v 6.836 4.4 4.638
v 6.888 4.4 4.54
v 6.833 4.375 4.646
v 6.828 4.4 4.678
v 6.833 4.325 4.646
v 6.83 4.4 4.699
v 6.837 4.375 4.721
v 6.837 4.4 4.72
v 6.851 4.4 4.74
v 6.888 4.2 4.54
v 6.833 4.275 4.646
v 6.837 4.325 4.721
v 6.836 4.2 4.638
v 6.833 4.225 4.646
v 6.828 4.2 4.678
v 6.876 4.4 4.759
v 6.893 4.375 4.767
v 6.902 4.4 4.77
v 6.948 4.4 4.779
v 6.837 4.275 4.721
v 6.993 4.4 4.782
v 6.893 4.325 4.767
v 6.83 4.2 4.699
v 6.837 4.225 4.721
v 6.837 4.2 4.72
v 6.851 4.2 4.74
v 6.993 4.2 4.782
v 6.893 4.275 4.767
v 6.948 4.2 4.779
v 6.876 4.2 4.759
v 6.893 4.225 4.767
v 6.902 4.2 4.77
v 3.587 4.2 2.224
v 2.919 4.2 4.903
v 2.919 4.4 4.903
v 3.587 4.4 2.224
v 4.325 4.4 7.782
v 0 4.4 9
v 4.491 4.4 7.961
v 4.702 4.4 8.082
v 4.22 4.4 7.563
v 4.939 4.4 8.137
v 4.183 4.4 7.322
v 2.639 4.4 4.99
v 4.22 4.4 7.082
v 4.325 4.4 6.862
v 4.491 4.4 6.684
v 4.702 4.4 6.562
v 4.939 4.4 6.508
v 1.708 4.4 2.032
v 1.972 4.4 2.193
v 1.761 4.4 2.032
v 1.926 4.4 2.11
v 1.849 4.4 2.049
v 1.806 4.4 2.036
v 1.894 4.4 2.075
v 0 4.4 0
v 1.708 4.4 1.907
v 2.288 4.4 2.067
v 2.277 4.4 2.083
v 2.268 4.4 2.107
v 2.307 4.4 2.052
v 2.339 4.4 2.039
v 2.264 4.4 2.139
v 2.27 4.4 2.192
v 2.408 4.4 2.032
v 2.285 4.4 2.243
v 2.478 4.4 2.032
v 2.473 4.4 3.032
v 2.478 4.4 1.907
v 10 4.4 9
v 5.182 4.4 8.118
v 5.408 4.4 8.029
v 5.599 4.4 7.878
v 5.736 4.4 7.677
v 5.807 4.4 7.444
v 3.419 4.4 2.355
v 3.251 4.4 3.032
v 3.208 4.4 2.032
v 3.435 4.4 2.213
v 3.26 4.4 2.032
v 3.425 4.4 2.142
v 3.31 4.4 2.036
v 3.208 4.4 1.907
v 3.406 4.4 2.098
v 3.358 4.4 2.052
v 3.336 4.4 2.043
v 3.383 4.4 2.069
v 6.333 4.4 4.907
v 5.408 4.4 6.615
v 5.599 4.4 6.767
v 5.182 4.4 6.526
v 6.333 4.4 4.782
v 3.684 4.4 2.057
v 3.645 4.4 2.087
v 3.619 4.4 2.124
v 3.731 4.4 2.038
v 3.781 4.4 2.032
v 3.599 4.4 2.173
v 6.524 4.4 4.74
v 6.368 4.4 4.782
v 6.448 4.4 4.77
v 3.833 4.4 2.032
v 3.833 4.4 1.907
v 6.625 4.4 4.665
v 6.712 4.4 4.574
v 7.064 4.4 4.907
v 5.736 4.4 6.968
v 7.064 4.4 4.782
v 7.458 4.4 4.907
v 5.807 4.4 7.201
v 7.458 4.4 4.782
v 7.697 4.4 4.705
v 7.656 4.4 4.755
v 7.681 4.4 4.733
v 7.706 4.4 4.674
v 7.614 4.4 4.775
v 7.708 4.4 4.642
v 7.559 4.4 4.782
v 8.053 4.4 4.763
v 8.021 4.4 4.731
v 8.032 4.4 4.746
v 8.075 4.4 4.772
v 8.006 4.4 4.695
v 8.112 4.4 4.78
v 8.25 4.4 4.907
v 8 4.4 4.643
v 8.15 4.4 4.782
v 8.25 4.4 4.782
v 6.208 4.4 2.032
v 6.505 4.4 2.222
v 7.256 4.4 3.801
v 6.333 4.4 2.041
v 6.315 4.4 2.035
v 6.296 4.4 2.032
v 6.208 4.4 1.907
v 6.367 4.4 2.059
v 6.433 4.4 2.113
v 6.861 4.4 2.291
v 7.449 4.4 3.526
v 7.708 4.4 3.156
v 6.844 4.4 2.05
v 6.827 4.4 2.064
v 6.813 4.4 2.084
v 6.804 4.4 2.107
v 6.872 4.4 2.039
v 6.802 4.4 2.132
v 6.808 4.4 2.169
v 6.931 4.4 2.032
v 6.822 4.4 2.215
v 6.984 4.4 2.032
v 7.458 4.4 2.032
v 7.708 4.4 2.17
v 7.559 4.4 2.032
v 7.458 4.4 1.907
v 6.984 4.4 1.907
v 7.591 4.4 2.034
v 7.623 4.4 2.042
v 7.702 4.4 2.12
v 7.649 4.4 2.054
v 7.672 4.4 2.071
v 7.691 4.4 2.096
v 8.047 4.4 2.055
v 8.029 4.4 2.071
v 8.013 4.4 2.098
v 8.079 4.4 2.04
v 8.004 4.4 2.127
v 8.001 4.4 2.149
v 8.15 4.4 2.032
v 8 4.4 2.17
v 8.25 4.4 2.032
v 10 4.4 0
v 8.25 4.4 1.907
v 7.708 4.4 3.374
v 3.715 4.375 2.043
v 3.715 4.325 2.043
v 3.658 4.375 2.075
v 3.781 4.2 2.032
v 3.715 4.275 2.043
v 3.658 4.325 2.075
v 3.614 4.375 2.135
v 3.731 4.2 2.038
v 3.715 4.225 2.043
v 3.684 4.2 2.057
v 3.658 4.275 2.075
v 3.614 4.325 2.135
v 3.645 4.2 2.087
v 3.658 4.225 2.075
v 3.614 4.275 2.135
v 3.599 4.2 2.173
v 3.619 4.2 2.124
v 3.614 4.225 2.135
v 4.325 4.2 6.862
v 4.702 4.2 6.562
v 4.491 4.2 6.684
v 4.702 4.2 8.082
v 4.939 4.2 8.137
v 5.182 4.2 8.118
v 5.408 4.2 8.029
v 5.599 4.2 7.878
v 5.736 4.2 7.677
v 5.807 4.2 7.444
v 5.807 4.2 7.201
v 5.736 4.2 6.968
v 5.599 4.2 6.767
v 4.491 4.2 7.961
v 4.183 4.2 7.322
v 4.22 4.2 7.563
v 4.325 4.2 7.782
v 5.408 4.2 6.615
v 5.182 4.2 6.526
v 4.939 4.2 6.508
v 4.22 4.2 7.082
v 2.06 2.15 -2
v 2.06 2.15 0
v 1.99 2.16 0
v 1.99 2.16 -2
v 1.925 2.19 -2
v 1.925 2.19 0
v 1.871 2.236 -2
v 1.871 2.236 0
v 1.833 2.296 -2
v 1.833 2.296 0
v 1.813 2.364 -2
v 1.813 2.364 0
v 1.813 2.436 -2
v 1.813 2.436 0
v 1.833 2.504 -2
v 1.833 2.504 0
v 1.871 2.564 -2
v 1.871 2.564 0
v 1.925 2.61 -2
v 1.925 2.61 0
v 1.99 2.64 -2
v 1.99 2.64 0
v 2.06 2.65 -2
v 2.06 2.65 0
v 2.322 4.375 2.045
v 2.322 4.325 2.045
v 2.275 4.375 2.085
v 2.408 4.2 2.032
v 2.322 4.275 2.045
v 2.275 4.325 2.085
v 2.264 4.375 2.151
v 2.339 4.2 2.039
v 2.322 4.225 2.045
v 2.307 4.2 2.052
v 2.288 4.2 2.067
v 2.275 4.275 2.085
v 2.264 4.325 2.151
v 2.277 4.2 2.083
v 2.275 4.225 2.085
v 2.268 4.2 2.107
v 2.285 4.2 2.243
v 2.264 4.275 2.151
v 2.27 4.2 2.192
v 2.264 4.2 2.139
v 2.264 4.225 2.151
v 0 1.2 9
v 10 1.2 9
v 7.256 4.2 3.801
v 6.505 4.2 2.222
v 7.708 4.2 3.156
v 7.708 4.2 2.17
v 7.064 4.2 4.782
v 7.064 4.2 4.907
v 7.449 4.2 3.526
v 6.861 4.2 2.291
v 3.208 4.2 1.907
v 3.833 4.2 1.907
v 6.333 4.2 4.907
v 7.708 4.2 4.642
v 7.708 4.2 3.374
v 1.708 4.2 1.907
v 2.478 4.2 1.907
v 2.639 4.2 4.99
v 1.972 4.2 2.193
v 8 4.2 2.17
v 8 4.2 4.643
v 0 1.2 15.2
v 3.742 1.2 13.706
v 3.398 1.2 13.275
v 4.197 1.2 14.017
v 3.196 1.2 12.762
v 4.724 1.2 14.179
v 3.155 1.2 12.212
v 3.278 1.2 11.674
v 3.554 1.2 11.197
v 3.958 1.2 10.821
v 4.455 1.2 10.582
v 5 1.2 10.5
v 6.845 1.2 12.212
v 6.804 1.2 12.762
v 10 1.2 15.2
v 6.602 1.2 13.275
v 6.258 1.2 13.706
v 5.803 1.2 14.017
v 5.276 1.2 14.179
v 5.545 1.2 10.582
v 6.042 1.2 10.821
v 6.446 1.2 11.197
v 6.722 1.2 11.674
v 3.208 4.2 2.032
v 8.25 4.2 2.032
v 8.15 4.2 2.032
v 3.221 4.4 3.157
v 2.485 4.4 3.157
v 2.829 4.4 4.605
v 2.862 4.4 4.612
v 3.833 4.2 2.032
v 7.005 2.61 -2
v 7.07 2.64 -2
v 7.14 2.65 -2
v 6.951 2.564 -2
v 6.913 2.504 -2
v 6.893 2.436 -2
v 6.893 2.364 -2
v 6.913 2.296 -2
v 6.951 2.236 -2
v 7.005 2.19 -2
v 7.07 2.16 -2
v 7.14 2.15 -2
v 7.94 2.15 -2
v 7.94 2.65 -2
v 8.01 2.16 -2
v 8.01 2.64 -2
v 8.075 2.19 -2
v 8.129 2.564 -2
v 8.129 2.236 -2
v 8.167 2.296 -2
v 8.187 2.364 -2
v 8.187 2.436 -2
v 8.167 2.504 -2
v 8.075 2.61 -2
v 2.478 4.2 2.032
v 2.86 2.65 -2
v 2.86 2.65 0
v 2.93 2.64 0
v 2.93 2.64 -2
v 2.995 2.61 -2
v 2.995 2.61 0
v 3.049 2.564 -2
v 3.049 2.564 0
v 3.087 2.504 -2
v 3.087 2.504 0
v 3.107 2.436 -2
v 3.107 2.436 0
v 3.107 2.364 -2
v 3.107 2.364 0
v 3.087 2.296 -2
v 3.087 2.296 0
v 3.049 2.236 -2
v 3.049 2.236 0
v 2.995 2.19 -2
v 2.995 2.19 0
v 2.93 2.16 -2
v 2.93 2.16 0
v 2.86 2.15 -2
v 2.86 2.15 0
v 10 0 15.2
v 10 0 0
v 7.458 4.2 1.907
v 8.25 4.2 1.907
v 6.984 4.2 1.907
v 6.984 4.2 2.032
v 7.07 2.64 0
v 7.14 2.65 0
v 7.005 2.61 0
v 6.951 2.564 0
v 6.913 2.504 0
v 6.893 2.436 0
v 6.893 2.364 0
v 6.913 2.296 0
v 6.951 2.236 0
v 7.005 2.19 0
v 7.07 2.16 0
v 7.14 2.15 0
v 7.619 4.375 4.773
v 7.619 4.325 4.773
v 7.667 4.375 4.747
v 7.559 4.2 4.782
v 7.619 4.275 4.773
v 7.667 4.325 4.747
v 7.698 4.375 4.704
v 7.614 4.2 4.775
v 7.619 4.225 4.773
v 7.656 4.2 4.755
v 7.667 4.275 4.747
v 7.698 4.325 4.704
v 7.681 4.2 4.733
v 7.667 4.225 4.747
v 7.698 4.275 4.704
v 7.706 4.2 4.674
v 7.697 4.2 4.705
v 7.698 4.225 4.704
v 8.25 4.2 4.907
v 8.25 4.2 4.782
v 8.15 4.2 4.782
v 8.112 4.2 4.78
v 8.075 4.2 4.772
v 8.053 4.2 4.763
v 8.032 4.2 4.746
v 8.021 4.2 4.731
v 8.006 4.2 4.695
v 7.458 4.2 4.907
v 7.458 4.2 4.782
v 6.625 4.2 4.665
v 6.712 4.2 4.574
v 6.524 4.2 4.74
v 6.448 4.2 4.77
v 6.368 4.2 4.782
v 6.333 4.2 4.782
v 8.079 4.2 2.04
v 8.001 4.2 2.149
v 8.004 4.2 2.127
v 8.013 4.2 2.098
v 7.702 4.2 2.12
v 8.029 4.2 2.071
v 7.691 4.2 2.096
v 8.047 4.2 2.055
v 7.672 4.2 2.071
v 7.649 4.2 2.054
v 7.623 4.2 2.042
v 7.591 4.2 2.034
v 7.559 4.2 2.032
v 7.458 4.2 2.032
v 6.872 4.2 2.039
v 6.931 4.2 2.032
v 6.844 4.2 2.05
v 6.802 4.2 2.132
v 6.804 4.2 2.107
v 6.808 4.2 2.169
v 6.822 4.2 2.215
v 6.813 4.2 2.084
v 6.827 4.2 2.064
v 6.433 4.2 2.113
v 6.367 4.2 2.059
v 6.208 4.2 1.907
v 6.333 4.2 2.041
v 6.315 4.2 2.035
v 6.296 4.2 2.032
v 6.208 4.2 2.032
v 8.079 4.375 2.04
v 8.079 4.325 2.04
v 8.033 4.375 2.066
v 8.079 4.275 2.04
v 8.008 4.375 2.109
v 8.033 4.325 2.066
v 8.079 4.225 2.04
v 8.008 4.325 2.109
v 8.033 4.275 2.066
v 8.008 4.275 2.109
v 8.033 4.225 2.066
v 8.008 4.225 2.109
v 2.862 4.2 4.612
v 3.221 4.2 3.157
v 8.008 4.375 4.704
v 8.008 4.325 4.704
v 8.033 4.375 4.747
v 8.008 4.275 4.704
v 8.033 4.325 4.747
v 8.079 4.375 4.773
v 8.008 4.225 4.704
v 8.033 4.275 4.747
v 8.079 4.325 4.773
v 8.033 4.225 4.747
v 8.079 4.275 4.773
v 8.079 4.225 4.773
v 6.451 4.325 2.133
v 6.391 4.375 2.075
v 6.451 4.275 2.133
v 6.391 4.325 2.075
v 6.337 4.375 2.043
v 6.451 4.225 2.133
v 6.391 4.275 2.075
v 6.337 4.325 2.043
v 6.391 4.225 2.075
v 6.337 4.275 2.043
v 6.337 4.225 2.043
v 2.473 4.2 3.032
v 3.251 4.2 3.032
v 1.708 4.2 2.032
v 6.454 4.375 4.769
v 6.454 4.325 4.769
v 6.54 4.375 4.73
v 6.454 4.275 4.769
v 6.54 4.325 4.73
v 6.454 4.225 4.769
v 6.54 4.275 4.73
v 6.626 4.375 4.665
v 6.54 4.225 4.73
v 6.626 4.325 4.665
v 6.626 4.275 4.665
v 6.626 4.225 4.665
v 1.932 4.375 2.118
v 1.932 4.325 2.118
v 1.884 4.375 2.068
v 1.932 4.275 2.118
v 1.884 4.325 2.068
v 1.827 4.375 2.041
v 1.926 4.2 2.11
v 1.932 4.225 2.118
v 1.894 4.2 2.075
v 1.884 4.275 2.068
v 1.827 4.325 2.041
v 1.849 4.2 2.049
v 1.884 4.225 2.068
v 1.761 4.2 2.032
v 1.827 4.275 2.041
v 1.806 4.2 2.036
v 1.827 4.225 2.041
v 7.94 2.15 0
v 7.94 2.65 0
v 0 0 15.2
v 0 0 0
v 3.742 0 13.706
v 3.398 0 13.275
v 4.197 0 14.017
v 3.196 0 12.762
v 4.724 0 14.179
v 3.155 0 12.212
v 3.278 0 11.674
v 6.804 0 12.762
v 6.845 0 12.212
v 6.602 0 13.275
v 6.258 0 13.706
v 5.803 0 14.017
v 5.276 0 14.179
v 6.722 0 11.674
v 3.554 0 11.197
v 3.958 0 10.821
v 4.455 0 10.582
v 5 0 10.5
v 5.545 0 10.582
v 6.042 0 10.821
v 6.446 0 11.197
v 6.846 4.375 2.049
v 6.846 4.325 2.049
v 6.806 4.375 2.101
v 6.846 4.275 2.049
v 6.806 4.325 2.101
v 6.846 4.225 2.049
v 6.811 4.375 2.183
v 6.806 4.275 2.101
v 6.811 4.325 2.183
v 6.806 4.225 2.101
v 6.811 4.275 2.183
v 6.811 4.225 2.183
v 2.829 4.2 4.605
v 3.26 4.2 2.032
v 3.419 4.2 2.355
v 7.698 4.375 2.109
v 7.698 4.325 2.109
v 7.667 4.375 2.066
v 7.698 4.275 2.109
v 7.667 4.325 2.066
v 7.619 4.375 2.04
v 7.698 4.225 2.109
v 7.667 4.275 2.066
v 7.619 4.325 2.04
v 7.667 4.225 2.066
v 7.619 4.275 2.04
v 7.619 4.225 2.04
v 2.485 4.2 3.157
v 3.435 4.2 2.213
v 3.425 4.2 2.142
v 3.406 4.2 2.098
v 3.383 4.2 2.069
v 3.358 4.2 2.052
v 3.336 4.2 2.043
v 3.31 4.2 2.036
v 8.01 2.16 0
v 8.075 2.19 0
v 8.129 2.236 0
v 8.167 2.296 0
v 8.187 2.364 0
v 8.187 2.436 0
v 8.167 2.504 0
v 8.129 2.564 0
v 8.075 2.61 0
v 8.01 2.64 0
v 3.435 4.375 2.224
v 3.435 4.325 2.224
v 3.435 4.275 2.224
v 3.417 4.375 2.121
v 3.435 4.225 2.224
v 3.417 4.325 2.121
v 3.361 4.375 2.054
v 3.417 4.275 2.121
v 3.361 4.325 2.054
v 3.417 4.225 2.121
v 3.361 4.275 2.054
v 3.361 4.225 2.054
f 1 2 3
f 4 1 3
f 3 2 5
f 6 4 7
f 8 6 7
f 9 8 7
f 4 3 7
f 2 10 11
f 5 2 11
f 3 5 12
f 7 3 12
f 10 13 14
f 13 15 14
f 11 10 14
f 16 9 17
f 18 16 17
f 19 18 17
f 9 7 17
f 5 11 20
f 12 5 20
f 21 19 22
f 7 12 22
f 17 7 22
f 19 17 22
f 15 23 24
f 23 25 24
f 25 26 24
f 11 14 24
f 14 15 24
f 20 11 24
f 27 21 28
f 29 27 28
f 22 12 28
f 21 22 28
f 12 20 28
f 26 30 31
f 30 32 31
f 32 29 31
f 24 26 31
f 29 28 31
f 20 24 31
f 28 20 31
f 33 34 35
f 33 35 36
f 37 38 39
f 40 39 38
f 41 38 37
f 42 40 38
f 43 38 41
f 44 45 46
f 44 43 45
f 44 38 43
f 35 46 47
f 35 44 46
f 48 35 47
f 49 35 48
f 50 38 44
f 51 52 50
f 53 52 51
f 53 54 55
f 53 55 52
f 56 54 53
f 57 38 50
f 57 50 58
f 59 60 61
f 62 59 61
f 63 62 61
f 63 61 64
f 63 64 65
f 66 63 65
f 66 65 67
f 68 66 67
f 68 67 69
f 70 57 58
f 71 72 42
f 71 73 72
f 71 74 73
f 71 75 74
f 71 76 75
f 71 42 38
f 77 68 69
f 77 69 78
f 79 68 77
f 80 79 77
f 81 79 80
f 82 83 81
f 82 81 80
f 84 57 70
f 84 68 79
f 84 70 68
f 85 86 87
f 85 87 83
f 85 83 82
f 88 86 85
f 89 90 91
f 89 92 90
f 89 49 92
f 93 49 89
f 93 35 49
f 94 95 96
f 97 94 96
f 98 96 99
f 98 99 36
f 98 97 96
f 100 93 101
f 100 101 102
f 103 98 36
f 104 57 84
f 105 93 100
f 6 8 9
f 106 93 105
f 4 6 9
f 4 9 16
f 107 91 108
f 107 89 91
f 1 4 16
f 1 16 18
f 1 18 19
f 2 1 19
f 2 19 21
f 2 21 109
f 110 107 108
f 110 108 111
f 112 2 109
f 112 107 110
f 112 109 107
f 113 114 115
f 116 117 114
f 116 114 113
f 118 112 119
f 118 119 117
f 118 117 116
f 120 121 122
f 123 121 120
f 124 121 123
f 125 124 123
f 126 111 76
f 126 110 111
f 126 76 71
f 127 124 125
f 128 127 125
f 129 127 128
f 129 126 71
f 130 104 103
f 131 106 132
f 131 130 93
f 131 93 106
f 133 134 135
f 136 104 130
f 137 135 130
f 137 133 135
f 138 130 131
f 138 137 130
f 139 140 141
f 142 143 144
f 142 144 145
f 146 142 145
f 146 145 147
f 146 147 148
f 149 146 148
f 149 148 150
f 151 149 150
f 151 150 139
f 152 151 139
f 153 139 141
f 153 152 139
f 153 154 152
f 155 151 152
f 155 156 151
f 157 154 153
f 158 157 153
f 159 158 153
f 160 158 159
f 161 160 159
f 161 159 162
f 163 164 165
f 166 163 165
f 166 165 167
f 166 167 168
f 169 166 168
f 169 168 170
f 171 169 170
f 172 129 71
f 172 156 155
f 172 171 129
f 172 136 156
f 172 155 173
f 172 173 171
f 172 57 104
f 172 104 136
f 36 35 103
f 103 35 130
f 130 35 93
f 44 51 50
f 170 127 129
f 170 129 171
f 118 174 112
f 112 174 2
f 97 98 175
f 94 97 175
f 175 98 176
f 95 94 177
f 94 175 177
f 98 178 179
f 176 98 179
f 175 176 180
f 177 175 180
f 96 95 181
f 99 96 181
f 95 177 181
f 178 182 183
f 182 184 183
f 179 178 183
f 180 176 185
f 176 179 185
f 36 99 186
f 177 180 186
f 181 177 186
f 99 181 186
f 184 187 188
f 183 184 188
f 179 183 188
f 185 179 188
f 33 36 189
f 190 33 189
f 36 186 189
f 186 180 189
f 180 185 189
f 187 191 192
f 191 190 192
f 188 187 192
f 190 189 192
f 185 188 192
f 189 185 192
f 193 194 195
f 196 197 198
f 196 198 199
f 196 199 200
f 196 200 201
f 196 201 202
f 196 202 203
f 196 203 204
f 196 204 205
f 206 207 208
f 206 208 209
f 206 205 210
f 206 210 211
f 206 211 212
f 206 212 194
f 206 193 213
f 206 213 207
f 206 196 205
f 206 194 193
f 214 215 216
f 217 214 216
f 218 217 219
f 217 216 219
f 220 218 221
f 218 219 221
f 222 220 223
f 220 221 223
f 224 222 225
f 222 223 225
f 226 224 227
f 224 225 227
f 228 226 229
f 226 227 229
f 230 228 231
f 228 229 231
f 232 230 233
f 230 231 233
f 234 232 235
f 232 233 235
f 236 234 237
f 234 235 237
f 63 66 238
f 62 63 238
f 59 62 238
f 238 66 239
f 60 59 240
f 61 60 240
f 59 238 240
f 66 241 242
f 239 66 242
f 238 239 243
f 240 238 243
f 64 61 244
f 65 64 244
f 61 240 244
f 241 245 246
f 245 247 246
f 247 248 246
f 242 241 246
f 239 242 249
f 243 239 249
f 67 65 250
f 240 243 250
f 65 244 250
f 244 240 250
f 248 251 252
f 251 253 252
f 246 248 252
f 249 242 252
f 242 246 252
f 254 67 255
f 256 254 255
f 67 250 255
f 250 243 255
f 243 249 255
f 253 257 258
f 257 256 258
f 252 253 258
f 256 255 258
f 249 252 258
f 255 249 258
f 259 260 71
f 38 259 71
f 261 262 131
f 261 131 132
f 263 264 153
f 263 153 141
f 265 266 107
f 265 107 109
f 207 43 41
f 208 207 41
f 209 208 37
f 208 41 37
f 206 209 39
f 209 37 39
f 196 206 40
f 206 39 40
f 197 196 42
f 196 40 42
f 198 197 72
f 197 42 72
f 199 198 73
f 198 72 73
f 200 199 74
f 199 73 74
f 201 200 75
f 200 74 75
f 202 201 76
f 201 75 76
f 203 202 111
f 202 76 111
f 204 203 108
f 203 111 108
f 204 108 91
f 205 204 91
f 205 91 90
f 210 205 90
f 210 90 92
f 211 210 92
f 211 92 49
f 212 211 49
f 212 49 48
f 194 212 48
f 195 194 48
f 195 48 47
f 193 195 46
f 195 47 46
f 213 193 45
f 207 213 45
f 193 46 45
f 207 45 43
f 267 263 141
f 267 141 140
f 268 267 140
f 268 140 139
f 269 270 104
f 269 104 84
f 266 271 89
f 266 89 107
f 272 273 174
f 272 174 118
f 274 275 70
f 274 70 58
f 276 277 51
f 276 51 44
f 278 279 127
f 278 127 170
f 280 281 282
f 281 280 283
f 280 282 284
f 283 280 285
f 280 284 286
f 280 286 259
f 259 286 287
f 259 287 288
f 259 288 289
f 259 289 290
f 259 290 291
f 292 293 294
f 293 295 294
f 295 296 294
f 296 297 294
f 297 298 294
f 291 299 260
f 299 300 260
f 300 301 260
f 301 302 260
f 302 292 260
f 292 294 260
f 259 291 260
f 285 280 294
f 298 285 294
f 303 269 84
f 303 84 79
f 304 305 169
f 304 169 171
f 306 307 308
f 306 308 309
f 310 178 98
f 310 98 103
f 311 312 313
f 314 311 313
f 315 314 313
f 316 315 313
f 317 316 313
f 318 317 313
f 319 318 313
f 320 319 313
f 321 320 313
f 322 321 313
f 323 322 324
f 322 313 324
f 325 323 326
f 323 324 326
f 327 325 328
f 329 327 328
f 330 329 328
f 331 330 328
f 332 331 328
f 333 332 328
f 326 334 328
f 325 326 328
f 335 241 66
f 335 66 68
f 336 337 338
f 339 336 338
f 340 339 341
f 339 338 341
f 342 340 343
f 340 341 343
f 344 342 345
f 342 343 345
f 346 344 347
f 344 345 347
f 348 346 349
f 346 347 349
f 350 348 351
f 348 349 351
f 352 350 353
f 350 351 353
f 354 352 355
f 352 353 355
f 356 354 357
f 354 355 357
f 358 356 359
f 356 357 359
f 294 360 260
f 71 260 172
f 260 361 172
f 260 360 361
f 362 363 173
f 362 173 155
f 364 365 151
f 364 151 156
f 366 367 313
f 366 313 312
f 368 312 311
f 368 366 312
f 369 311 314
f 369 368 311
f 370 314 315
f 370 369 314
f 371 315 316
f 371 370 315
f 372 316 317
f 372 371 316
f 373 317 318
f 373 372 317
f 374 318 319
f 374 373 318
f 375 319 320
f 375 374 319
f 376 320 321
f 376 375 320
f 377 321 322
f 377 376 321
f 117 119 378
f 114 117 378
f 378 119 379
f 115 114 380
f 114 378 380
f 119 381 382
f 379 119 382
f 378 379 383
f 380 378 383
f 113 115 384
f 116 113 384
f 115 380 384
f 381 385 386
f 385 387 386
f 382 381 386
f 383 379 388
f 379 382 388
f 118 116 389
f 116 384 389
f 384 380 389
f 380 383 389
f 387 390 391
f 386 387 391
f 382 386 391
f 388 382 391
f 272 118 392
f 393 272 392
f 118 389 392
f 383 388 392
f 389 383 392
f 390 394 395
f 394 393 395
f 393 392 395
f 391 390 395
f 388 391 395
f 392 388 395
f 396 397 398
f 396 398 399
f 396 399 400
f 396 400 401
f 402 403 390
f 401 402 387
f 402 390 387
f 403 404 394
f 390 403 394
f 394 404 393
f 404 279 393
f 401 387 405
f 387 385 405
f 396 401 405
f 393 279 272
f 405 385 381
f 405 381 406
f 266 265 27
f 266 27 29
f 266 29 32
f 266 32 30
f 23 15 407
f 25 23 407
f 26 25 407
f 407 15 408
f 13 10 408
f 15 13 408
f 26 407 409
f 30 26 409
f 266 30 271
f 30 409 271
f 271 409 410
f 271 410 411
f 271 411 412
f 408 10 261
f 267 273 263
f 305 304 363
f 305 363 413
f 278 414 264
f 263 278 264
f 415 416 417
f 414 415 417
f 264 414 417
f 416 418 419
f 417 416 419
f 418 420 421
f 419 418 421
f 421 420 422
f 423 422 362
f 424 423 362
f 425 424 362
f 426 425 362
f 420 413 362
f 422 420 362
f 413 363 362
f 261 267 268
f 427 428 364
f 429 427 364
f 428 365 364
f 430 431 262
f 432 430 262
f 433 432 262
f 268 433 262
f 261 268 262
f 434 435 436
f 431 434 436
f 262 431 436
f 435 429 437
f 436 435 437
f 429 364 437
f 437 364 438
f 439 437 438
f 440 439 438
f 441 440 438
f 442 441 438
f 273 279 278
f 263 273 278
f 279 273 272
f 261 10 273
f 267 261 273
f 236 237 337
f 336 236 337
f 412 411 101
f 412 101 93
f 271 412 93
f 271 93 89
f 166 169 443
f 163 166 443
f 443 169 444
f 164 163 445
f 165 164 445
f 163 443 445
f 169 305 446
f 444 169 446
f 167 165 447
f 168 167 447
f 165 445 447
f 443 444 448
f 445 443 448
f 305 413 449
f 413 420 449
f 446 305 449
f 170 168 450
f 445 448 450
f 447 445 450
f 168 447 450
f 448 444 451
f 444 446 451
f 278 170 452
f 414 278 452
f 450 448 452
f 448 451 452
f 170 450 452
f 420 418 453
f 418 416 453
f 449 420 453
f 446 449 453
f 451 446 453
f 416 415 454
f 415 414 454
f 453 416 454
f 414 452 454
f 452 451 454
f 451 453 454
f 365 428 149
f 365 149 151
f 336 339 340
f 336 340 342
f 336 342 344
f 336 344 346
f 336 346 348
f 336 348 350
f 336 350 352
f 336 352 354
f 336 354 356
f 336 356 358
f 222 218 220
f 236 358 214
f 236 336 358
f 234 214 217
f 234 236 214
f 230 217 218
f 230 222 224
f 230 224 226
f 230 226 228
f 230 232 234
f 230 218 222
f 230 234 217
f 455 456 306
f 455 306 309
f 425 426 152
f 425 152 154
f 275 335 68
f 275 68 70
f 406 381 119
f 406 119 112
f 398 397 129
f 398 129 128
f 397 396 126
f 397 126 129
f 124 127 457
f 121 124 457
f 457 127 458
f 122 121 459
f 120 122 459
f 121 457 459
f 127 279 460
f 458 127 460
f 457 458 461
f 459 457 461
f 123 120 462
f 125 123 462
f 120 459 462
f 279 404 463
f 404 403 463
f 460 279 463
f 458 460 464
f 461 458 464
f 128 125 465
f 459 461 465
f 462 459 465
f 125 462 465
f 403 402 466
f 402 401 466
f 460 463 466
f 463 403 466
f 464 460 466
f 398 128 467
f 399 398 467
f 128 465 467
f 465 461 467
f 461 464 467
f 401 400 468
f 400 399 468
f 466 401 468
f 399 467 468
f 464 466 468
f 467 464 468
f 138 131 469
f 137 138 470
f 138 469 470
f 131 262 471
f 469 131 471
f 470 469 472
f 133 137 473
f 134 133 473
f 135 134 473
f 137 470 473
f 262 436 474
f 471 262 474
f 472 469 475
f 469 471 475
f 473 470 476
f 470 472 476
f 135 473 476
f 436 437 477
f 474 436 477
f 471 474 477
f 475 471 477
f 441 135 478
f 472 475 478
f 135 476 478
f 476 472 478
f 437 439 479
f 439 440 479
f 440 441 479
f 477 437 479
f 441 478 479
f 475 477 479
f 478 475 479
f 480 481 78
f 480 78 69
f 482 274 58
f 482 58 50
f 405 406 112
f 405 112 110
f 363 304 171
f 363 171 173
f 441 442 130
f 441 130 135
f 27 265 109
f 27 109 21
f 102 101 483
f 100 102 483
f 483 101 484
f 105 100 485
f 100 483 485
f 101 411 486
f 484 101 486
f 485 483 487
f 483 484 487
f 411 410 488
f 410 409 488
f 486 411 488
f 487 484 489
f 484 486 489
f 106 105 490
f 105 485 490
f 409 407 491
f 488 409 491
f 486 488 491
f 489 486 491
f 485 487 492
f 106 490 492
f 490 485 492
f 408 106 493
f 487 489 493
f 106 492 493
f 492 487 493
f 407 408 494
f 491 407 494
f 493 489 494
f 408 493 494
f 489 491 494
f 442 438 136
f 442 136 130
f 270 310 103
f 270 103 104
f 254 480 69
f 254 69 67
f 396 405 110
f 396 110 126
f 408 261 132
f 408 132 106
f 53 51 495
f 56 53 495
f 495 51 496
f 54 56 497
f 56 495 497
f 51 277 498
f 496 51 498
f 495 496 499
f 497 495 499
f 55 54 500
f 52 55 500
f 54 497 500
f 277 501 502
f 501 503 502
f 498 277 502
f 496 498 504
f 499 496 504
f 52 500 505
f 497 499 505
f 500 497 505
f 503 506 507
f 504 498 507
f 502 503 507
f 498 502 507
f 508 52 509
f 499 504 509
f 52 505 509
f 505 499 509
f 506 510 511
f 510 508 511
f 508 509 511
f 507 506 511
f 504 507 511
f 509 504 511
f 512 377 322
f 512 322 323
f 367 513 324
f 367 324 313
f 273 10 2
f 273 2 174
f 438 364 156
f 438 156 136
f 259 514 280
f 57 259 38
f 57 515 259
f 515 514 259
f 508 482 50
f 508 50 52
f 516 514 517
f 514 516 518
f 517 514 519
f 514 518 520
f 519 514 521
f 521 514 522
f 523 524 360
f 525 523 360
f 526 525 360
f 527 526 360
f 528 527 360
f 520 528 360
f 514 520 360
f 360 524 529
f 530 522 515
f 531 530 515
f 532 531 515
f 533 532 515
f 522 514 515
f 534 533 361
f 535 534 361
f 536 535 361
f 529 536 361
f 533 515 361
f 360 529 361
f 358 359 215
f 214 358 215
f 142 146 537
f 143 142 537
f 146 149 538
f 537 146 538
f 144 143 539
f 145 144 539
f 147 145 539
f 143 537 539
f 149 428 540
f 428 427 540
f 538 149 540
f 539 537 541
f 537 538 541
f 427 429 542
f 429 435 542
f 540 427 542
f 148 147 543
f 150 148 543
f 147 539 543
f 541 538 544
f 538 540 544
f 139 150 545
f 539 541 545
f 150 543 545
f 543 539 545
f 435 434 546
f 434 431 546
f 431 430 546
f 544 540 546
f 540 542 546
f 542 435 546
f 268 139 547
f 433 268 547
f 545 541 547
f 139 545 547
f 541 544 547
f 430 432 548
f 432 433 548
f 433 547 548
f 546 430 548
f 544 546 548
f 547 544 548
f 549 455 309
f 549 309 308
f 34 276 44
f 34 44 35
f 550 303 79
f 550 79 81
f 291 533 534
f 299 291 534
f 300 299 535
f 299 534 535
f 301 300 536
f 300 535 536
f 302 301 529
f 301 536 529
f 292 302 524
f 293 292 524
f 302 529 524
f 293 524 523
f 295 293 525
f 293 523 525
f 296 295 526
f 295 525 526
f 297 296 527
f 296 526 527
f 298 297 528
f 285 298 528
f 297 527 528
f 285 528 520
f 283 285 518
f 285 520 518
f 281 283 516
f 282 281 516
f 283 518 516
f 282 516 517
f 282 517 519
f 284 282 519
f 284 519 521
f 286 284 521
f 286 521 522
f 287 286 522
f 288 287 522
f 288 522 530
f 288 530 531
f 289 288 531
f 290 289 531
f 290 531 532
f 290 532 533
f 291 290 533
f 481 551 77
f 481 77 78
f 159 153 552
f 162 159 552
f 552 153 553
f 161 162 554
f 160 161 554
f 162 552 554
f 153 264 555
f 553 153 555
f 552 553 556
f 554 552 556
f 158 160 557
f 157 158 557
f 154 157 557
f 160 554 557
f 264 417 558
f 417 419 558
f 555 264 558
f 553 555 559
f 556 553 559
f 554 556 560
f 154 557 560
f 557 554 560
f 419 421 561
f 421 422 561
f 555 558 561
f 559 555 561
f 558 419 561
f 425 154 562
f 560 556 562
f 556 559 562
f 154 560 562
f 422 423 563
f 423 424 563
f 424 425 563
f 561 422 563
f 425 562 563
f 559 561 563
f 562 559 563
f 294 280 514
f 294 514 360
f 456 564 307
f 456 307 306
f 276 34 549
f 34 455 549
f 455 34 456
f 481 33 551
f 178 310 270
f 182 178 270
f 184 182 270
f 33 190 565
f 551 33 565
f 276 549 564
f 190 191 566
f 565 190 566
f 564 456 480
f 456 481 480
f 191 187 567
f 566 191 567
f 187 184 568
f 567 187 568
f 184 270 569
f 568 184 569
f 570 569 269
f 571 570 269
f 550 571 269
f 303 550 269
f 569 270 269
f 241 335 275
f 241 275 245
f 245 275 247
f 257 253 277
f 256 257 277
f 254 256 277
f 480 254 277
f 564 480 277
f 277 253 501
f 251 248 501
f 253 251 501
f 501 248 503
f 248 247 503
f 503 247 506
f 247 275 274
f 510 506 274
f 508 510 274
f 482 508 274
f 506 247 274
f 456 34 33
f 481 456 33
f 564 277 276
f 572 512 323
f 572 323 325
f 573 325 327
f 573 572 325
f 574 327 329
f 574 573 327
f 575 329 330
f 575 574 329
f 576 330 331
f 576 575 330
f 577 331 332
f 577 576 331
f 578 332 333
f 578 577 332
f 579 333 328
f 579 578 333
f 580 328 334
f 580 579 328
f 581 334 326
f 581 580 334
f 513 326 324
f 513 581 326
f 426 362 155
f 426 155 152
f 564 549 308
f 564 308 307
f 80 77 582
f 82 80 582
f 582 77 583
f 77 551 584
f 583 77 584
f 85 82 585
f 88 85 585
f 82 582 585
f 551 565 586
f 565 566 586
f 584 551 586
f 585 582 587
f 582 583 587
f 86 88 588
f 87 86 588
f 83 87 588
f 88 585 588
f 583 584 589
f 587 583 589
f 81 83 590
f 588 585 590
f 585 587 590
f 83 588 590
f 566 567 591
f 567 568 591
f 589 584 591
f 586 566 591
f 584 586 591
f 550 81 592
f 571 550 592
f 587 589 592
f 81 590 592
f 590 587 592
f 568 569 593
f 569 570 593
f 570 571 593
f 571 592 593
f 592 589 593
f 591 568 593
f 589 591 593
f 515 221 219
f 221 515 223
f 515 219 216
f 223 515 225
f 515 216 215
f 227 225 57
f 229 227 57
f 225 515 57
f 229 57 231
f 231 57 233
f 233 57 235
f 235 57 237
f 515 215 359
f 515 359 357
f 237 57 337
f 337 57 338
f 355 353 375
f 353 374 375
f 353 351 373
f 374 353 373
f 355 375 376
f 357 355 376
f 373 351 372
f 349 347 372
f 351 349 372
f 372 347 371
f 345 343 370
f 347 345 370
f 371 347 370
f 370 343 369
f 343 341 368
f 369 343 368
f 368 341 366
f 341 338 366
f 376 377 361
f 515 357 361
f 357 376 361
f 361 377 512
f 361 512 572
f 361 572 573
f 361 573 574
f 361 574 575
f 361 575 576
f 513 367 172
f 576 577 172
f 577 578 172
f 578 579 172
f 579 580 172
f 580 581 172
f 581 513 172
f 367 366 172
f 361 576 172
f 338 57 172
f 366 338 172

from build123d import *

# Parameters (mm, degrees)
SKETCH_1_W          = 10
SKETCH_1_H          = 4.4
EXTRUDE_1_DEPTH     = 15.2
SKETCH_2_W          = 6.2
SKETCH_2_H          = 3.2
CUT_EXTRUDE_1_DEPTH = 19.718974331
CUT_EXTRUDE_2_REACH = 20.719
SKETCH_3_R          = 1.85
SKETCH_4_R          = 0.816532351
CUT_EXTRUDE_3_DEPTH = 0.2
EXTRUDE_2_DEPTH     = 2
WRAP_START          = -0.2
WRAP_1_DEPTH        = 0.2


# Read off the part's stored shape, not the designer's step: 包覆1
with BuildPart() as part:
    # 草图1 → 凸台-拉伸1 (new body)
    with BuildSketch(Plane.XY):
        with Locations((5, 2.2)):
            Rectangle(SKETCH_1_W, SKETCH_1_H)
    extrude(amount=EXTRUDE_1_DEPTH)

    # 草图2 → 切除-拉伸1 (cut, through all)
    with BuildSketch(Plane(origin=(10, 0, 0), x_dir=(0, 0, -1), z_dir=(1, 0, 0))):
        with Locations((-12.1, 2.8)):
            Rectangle(SKETCH_2_W, SKETCH_2_H)
    extrude(amount=-CUT_EXTRUDE_1_DEPTH, mode=Mode.SUBTRACT)

    # 草图3 → 切除-拉伸2 (cut, up to next)
    with BuildSketch(Plane.XZ, mode=Mode.PRIVATE) as cut_extrude_2_sk1:
        with Locations(Location((5, 12.35, 0), (0, 0, 270))):
            Circle(SKETCH_3_R)
    cut_extrude_2_tool1 = extrude(cut_extrude_2_sk1.sketch, amount=-CUT_EXTRUDE_2_REACH, mode=Mode.PRIVATE) & part.part
    add(cut_extrude_2_tool1.solids().sort_by_distance((5, 0, 12.35))[0], mode=Mode.SUBTRACT)

    # 草图4 → 切除-拉伸3 (cut)
    with BuildSketch(Plane(origin=(0, 4.4, 0), x_dir=(-1, 0, 0), z_dir=(0, 1, 0))):
        with Locations((-5, 7.32228291)):
            Circle(SKETCH_4_R)
    extrude(amount=-CUT_EXTRUDE_3_DEPTH, mode=Mode.SUBTRACT)

    # 草图5 → 凸台-拉伸2 (add)
    with BuildSketch(Plane(origin=(0, 0, 0), x_dir=(-1, 0, 0), z_dir=(0, 0, -1))):
        with BuildLine():
            Line((-7.94, 2.65), (-7.14, 2.65))
            ThreePointArc((-7.14, 2.65), (-6.89, 2.4), (-7.14, 2.15))
            Line((-7.14, 2.15), (-7.94, 2.15))
            ThreePointArc((-7.94, 2.15), (-8.19, 2.4), (-7.94, 2.65))
        make_face()
        with BuildLine():
            Line((-2.06, 2.65), (-2.86, 2.65))
            ThreePointArc((-2.86, 2.65), (-3.11, 2.4), (-2.86, 2.15))
            Line((-2.86, 2.15), (-2.06, 2.15))
            ThreePointArc((-2.06, 2.15), (-1.81, 2.4), (-2.06, 2.65))
        make_face()
    extrude(amount=EXTRUDE_2_DEPTH)

    # 包覆1 outline → 包覆1 (cut)
    # profile 1 of 2: a face of its own
    with BuildSketch(Plane(origin=(0, 4.4, 0), x_dir=(1, 0, 0), z_dir=(0, 1, 0)).offset(WRAP_START)):
        with BuildLine():
            add(Edge.make_bspline(
                [(6.930989583, -2.031758229), (6.915107326, -2.032625879), (6.886212727, -2.034204394), (6.846667333, -2.045372179), (6.819228063, -2.069428088), (6.803221049, -2.101586149), (6.801017387, -2.141193863), (6.810949266, -2.186053613), (6.830123901, -2.237549844), (6.849896632, -2.272058221), (6.860677083, -2.290872813)],
                knots=[0, 0, 0, 0, 0.134063604, 0.243901978, 0.338487503, 0.432506005, 0.538929196, 0.665491452, 0.817619881, 1, 1, 1, 1], degree=3))
            Line((6.930989583, -2.031758229), (6.983723958, -2.031758229))
            Line((6.983723958, -2.031758229), (6.983723958, -1.906758229))
            Line((6.983723958, -1.906758229), (6.208333333, -1.906758229))
            Line((6.208333333, -1.906758229), (6.208333333, -2.031758229))
            Line((6.208333333, -2.031758229), (6.295572917, -2.031758229))
            add(Edge.make_bspline(
                [(6.504557292, -2.221862396), (6.495929833, -2.205652704), (6.479665398, -2.175094288), (6.45244636, -2.133930793), (6.422954526, -2.101143884), (6.393052529, -2.075772209), (6.364287696, -2.056836396), (6.33849766, -2.04342026), (6.316216749, -2.033596626), (6.301937753, -2.032325038), (6.295572917, -2.031758229)],
                knots=[0, 0, 0, 0, 0.187742948, 0.353931892, 0.503213882, 0.637048905, 0.753995091, 0.854253228, 0.93503364, 1, 1, 1, 1], degree=3))
            Line((6.504557292, -2.221862396), (7.255859375, -3.800638438))
            Line((7.255859375, -3.800638438), (6.711588542, -4.574075938))
            add(Edge.make_bspline(
                [(6.367838542, -4.781758229), (6.382221439, -4.781136361), (6.411311872, -4.779878589), (6.454540631, -4.769294334), (6.498129706, -4.753858707), (6.541134976, -4.730459287), (6.584266179, -4.700950899), (6.627240555, -4.66479857), (6.670366285, -4.622362568), (6.697506142, -4.590571678), (6.711588542, -4.574075938)],
                knots=[0, 0, 0, 0, 0.103884895, 0.210114587, 0.320338877, 0.43759129, 0.56296606, 0.6978075, 0.843197564, 1, 1, 1, 1], degree=3))
            Line((6.367838542, -4.781758229), (6.333333333, -4.781758229))
            Line((6.333333333, -4.781758229), (6.333333333, -4.906758229))
            Line((6.333333333, -4.906758229), (7.063802083, -4.906758229))
            Line((7.063802083, -4.906758229), (7.063802083, -4.781758229))
            Line((7.063802083, -4.781758229), (6.993489583, -4.781758229))
            add(Edge.make_bspline(
                [(6.888020833, -4.539570729), (6.875914449, -4.558101633), (6.854053882, -4.591562992), (6.832516724, -4.641371555), (6.825349297, -4.68501694), (6.834657735, -4.72263487), (6.859636327, -4.75025169), (6.89505428, -4.769644136), (6.941090575, -4.779777335), (6.974999933, -4.781059246), (6.993489583, -4.781758229)],
                knots=[0, 0, 0, 0, 0.178363102, 0.322071271, 0.434997506, 0.529283499, 0.62366698, 0.72638665, 0.850807703, 1, 1, 1, 1], degree=3))
            Line((6.888020833, -4.539570729), (7.708333333, -3.374206146))
            Line((7.708333333, -3.374206146), (7.708333333, -4.642435313))
            add(Edge.make_bspline(
                [(7.55859375, -4.781758229), (7.569261505, -4.781466132), (7.589734391, -4.780905556), (7.618905697, -4.774334821), (7.644615767, -4.763072355), (7.667304115, -4.748054599), (7.686035697, -4.728256372), (7.69919622, -4.703300066), (7.707027639, -4.674151855), (7.707884523, -4.653337332), (7.708333333, -4.642435313)],
                knots=[0, 0, 0, 0, 0.137639342, 0.264148789, 0.383430361, 0.498519415, 0.613574313, 0.731497168, 0.859366305, 1, 1, 1, 1], degree=3))
            Line((7.55859375, -4.781758229), (7.458333333, -4.781758229))
            Line((7.458333333, -4.781758229), (7.458333333, -4.906758229))
            Line((7.458333333, -4.906758229), (8.25, -4.906758229))
            Line((8.25, -4.906758229), (8.25, -4.781758229))
            Line((8.25, -4.781758229), (8.149739583, -4.781758229))
            add(Edge.make_bspline(
                [(8, -4.643086354), (8.000247716, -4.65398027), (8.000713759, -4.674475698), (8.007493922, -4.70308304), (8.017717416, -4.727550741), (8.032366625, -4.748243586), (8.05327597, -4.763833527), (8.080059672, -4.774757464), (8.113000414, -4.780982371), (8.136907743, -4.781487246), (8.149739583, -4.781758229)],
                knots=[0, 0, 0, 0, 0.137957594, 0.25954853, 0.370573832, 0.47303595, 0.577150492, 0.696855208, 0.837292342, 1, 1, 1, 1], degree=3))
            Line((8, -4.643086354), (8, -2.170430104))
            add(Edge.make_bspline(
                [(8.149739583, -2.031758229), (8.136907977, -2.032029309), (8.113001084, -2.032534363), (8.080057551, -2.038758127), (8.053282295, -2.049685522), (8.032346439, -2.065264608), (8.017909992, -2.085832582), (8.007221233, -2.110117779), (8.000820991, -2.138857995), (8.00028302, -2.159546252), (8, -2.170430104)],
                knots=[0, 0, 0, 0, 0.162681349, 0.303095774, 0.422781134, 0.526878841, 0.629324391, 0.737809695, 0.862064713, 1, 1, 1, 1], degree=3))
            Line((8.149739583, -2.031758229), (8.25, -2.031758229))
            Line((8.25, -2.031758229), (8.25, -1.906758229))
            Line((8.25, -1.906758229), (7.458333333, -1.906758229))
            Line((7.458333333, -1.906758229), (7.458333333, -2.031758229))
            Line((7.458333333, -2.031758229), (7.55859375, -2.031758229))
            add(Edge.make_bspline(
                [(7.708333333, -2.170430104), (7.707872164, -2.159534741), (7.706991684, -2.138732927), (7.699369622, -2.109684264), (7.685819191, -2.085165103), (7.667326615, -2.065449868), (7.644609508, -2.05044744), (7.618907501, -2.039180676), (7.589733882, -2.032611175), (7.569261331, -2.03205042), (7.55859375, -2.031758229)],
                knots=[0, 0, 0, 0, 0.14098033, 0.269164641, 0.384913342, 0.500251829, 0.615624556, 0.735200135, 0.862021403, 1, 1, 1, 1], degree=3))
            Line((7.708333333, -2.170430104), (7.708333333, -3.156107188))
            Line((7.708333333, -3.156107188), (7.448567708, -3.525898854))
            Line((7.448567708, -3.525898854), (6.860677083, -2.290872813))
        make_face()
    # profile 2 of 2: a face of its own
    with BuildSketch(Plane(origin=(0, 4.4, 0), x_dir=(1, 0, 0), z_dir=(0, 1, 0)).offset(WRAP_START)):
        with BuildLine():
            add(Edge.make_bspline(
                [(3.418619792, -2.355325938), (3.423290626, -2.332189778), (3.432052726, -2.288788256), (3.436281258, -2.225966665), (3.432219716, -2.170311627), (3.419748545, -2.121523718), (3.397043855, -2.080672541), (3.361471203, -2.050596509), (3.313901494, -2.03475832), (3.27919164, -2.032811362), (3.260416667, -2.031758229)],
                knots=[0, 0, 0, 0, 0.164440403, 0.308476601, 0.437530233, 0.552061218, 0.657168364, 0.758108431, 0.86915797, 1, 1, 1, 1], degree=3))
            Line((3.418619792, -2.355325938), (3.251302083, -3.031758229))
            Line((3.251302083, -3.031758229), (2.47265625, -3.031758229))
            Line((2.47265625, -3.031758229), (2.284505208, -2.243346771))
            add(Edge.make_bspline(
                [(2.407552083, -2.031758229), (2.391667135, -2.032296875), (2.362566209, -2.033283664), (2.3231508, -2.042204366), (2.293092672, -2.059473632), (2.273233438, -2.084737484), (2.26487379, -2.11648377), (2.262976163, -2.153509682), (2.270537673, -2.196694946), (2.279598478, -2.226958202), (2.284505208, -2.243346771)],
                knots=[0, 0, 0, 0, 0.152863017, 0.280042176, 0.385019123, 0.480297622, 0.580749292, 0.695821655, 0.835277215, 1, 1, 1, 1], degree=3))
            Line((2.407552083, -2.031758229), (2.477864583, -2.031758229))
            Line((2.477864583, -2.031758229), (2.477864583, -1.906758229))
            Line((2.477864583, -1.906758229), (1.708333333, -1.906758229))
            Line((1.708333333, -1.906758229), (1.708333333, -2.031758229))
            Line((1.708333333, -2.031758229), (1.761067708, -2.031758229))
            add(Edge.make_bspline(
                [(1.972005208, -2.192565521), (1.966073989, -2.178707602), (1.9549211, -2.152649581), (1.933551487, -2.118325589), (1.911064572, -2.089505922), (1.884961055, -2.067865098), (1.857221348, -2.050878644), (1.826723244, -2.040325548), (1.794671237, -2.032437792), (1.772404332, -2.031987489), (1.761067708, -2.031758229)],
                knots=[0, 0, 0, 0, 0.158644365, 0.298310162, 0.425134921, 0.541996665, 0.653801398, 0.765979904, 0.880854674, 1, 1, 1, 1], degree=3))
            Line((1.972005208, -2.192565521), (2.639322917, -4.990091563))
            Line((2.639322917, -4.990091563), (2.918619792, -4.902851979))
            Line((2.918619792, -4.902851979), (3.587239583, -2.224466563))
            add(Edge.make_bspline(
                [(3.780598958, -2.031758229), (3.769253734, -2.032178513), (3.74688055, -2.033007326), (3.714560239, -2.042036162), (3.684338324, -2.05569344), (3.656371612, -2.074852871), (3.631282534, -2.10088588), (3.612447742, -2.135739762), (3.596389822, -2.177235982), (3.590420449, -2.208047958), (3.587239583, -2.224466563)],
                knots=[0, 0, 0, 0, 0.1127485, 0.22234404, 0.331662042, 0.442001332, 0.558219825, 0.688003095, 0.833747961, 1, 1, 1, 1], degree=3))
            Line((3.780598958, -2.031758229), (3.833333333, -2.031758229))
            Line((3.833333333, -2.031758229), (3.833333333, -1.906758229))
            Line((3.833333333, -1.906758229), (3.207682292, -1.906758229))
            Line((3.207682292, -1.906758229), (3.207682292, -2.031758229))
            Line((3.207682292, -2.031758229), (3.260416667, -2.031758229))
        make_face()
        Polygon((2.485026042, -3.156758229), (3.221354167, -3.156758229), (2.861979167, -4.612487396), (2.829427083, -4.604674896), align=None, mode=Mode.SUBTRACT)
    extrude(amount=WRAP_1_DEPTH, mode=Mode.SUBTRACT)


solid = part.part
